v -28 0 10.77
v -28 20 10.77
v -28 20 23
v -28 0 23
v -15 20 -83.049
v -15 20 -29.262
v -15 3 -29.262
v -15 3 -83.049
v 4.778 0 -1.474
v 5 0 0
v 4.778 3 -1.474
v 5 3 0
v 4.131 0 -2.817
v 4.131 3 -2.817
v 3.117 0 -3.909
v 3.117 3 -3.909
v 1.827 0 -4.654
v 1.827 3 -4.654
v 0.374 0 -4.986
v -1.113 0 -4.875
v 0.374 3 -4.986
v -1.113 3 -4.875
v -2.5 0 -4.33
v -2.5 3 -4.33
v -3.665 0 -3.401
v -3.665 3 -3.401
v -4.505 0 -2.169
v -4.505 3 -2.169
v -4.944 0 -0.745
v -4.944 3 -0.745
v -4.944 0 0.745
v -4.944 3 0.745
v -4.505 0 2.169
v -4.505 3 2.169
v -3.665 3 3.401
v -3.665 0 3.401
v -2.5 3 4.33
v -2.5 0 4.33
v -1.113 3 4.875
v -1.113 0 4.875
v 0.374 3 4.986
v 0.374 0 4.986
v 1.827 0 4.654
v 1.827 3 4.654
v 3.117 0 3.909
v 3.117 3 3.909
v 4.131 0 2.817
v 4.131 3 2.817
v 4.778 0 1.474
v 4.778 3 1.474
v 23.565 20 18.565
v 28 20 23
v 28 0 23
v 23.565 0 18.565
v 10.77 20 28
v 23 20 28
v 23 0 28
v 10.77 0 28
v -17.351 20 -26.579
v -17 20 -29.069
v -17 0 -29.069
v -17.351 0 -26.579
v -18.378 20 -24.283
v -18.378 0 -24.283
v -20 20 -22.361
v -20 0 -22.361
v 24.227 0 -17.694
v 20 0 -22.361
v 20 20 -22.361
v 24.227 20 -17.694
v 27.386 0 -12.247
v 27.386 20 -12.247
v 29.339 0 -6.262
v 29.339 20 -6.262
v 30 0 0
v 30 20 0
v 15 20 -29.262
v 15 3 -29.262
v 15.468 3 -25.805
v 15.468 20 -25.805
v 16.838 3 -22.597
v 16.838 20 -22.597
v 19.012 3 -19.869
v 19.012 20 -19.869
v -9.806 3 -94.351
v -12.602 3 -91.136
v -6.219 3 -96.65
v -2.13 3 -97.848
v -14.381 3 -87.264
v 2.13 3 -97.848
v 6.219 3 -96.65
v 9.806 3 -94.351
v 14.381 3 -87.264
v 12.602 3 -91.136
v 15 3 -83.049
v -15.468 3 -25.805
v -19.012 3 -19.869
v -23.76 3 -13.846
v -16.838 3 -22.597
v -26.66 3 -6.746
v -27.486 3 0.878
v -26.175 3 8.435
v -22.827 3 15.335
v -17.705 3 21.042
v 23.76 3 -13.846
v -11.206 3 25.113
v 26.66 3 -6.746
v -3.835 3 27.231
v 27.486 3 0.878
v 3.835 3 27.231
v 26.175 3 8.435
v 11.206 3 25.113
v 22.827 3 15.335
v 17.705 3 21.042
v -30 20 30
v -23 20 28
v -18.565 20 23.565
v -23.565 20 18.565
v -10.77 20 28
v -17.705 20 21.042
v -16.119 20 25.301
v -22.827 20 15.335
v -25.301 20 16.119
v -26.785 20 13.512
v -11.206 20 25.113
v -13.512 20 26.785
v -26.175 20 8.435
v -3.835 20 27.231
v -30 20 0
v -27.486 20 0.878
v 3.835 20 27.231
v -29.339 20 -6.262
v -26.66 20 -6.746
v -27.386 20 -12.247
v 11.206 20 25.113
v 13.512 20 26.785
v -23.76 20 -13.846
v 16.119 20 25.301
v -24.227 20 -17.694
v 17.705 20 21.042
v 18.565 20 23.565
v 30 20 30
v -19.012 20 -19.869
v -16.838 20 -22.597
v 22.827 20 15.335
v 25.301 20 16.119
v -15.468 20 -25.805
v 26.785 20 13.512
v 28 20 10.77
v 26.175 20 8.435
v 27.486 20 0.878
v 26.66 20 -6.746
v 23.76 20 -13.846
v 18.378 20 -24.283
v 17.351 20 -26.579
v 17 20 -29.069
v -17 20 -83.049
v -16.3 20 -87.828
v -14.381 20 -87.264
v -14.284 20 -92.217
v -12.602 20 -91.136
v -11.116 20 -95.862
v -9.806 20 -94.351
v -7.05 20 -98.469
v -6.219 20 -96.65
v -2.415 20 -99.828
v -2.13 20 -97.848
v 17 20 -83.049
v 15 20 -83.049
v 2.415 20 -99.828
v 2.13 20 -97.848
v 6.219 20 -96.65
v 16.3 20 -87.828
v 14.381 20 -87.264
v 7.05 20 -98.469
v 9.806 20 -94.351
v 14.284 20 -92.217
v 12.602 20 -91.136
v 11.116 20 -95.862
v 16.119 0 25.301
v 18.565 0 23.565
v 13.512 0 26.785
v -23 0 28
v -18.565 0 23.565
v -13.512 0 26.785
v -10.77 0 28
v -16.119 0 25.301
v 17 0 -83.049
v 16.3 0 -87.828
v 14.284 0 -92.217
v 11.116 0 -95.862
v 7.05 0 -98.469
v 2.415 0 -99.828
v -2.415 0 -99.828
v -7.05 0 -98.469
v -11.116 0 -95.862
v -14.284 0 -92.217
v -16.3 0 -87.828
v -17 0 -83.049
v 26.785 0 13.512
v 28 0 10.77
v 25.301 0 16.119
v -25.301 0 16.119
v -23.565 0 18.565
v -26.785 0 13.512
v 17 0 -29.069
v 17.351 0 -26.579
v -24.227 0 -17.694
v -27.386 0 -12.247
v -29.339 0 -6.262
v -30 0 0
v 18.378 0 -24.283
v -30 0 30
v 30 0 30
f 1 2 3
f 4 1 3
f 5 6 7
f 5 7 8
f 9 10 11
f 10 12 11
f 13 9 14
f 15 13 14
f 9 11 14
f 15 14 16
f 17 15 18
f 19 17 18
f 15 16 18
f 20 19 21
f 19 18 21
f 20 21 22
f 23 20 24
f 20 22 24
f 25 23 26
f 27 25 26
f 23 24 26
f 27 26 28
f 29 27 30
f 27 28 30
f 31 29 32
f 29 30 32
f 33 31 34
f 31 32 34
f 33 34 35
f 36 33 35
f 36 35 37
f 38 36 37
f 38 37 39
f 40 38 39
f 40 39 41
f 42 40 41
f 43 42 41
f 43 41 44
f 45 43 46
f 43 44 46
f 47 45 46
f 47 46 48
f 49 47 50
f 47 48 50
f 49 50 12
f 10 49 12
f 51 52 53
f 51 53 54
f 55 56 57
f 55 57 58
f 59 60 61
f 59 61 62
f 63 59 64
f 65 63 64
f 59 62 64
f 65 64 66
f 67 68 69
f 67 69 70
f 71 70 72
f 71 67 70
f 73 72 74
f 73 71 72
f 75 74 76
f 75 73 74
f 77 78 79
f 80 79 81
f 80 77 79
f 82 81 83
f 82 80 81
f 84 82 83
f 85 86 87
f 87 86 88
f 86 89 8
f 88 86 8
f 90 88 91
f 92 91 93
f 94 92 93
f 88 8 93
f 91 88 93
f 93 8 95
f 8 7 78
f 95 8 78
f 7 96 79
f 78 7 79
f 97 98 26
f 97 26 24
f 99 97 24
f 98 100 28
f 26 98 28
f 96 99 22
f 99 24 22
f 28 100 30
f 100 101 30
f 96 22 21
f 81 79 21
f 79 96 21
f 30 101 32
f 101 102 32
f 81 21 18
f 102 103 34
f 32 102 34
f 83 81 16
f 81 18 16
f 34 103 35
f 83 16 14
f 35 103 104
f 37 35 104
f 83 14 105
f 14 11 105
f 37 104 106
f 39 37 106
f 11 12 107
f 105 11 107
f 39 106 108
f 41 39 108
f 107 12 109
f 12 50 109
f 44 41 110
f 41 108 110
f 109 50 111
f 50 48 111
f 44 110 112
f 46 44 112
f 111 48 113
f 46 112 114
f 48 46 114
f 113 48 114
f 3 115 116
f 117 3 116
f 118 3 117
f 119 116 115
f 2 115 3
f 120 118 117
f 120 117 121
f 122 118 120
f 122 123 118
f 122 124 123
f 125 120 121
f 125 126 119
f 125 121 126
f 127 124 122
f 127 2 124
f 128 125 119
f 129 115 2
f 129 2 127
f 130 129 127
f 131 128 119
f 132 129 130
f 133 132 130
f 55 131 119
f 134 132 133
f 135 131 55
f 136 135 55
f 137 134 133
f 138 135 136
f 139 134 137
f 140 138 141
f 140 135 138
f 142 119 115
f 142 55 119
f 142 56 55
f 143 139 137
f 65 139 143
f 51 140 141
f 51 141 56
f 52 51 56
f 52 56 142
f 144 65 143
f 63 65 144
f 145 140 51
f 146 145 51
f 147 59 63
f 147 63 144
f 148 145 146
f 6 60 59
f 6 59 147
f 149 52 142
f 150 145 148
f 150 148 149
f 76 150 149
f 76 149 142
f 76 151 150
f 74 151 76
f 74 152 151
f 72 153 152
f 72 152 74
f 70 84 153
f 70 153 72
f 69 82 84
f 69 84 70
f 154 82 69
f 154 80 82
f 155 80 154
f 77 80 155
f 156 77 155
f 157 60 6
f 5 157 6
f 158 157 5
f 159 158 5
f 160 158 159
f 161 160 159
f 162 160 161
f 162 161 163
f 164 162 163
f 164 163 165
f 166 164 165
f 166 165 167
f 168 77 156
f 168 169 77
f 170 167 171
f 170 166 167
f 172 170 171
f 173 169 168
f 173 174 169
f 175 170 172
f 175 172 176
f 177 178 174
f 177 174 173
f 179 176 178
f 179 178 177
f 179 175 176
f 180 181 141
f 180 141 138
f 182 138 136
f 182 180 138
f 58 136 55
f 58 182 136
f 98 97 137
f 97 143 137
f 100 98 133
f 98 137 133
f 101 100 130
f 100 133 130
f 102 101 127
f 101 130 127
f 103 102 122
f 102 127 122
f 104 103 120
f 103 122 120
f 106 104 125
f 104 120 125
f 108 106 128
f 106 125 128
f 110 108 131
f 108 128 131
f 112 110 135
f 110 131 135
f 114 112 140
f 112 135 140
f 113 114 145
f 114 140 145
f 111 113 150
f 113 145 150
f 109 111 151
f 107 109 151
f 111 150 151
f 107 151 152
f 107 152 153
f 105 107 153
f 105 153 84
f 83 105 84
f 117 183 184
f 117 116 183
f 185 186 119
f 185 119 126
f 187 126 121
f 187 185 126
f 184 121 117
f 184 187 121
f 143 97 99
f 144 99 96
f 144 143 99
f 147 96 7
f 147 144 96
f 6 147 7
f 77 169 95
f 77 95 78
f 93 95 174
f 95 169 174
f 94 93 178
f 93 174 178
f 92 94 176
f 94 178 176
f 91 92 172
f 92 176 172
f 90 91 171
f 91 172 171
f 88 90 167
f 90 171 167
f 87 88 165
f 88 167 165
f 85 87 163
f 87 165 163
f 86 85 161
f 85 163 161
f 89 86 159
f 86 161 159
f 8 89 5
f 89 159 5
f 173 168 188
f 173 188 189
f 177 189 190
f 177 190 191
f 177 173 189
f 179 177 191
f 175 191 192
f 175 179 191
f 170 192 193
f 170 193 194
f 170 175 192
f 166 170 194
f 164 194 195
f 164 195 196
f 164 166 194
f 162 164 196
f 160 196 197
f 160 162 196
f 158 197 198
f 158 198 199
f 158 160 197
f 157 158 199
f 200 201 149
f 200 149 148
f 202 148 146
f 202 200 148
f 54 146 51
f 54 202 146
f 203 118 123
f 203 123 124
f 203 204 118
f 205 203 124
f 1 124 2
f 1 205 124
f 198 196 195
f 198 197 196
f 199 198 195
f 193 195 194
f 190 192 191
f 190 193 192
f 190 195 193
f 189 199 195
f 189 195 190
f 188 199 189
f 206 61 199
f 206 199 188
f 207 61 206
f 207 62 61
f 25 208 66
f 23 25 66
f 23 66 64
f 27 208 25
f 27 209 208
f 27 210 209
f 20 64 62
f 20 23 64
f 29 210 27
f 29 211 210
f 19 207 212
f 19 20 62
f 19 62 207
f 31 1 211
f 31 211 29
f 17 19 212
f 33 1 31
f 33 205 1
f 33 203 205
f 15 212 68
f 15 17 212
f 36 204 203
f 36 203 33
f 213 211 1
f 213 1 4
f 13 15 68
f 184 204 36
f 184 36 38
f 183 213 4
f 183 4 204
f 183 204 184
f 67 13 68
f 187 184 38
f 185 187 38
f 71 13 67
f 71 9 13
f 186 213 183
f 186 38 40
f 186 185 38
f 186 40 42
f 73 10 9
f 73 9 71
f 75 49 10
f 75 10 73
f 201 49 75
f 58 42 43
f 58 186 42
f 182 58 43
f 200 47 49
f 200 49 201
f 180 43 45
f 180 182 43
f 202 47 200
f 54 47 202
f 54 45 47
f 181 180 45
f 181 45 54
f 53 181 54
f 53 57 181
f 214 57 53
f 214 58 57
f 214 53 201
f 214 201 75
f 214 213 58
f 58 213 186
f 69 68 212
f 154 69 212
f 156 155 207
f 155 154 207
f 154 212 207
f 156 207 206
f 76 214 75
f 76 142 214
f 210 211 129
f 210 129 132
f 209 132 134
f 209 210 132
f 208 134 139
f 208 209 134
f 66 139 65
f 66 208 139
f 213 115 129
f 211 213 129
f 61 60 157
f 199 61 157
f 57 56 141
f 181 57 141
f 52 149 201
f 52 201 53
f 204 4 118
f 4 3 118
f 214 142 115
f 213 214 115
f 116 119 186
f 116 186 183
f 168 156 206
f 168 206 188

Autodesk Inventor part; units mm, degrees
ref_plane "YZ Plane" through (0, 0, 0) normal (1, 0, 0) x (0, 1, 0)
ref_plane "XZ Plane" through (0, 0, 0) normal (0, 1, 0) x (-1, 0, 0)
ref_plane "XY Plane" through (0, 0, 0) normal (0, 0, 1) x (1, 0, 0)
sketch "Sketch2" plane through (0, 0, 0) normal (0, 1, 0) x (-1, 0, 0)
  circle A0 centre (0, 0) radius 30
  dimension "d0" = 60
extrude "Extrusion1" add sketch "Sketch2" along normal blind 20
sketch "Sketch3" plane through (0, 20, 0) normal (0, 1, 0) x (1, 0, 0)
  circle A0 centre (0, 0) radius 27.5
  dimension "d3" = 55
extrude "Extrusion2" cut sketch "Sketch3" against normal blind 17
sketch "Sketch4" plane through (0, 3, 0) normal (0, 1, 0) x (1, 0, 0)
  circle A0 centre (0, 0) radius 5
  dimension "d6" = 10
extrude "Extrusion3" cut sketch "Sketch4" against normal blind 5
sketch "Sketch9" plane through (0, 20, 0) normal (0, 1, 0) x (1, 0, 0)
  line L0 (-15, 35) -> (15, 35)
  line L1 (15, 35) -> (15, 20)
  line L2 (15, 20) -> (-15, 20)
  line L3 (-15, 20) -> (-15, 35)
  circle A0 centre (0, 0) radius 27.5 projected
  line L4 (-15, 35) -> (15, 20) construction
  line L5 (15, 35) -> (-15, 20) construction
  point P0 (0, 27.5)
extrude "Extrusion6" cut sketch "Sketch9" against normal blind 17 contours L0 L1 A0 L3 | A0 L1 L2 L3 picked at (1.0554, 22.439)
sketch "Sketch10" plane through (0, 20, 0) normal (0, 1, 0) x (1, 0, 0)
  arc A0 (-15, 23.0489) -> (15, 23.0489) centre (0, 0) ccw projected
  line L0 (-15, 23.0489) -> (-17, 23.0489)
  line L1 (-17, 23.0489) -> (-17, 83.0489)
  line L2 (-17, 83.0489) -> (-15, 83.0489)
  line L3 (-15, 83.0489) -> (-15, 23.0489)
  line L4 (15, 25.9808) -> (15, 23.0489) projected
  line L5 (15, 23.0489) -> (17, 23.0489)
  line L6 (17, 23.0489) -> (17, 83.0489)
  line L7 (17, 83.0489) -> (15, 83.0489)
  line L8 (15, 83.0489) -> (15, 23.0489)
  dimension "d17" = 60
  dimension "d18" = 60
extrude "Extrusion7" add sketch "Sketch10" against normal blind 20
fillet "Fillet1" radius 13 1 edges at (-15, 11.5, -23.0489)
fillet "Fillet2" radius 9 1 edges at (-17, 10, -24.7184)
fillet "Fillet3" radius 13 1 edges at (15, 11.5, -23.0489)
fillet "Fillet4" radius 9 1 edges at (17, 10, -24.7184)
sketch "Sketch12" plane through (0, 0, 0) normal (0, -1, 0) x (1, 0, 0)
  line L0 (-15, -29.2617) -> (-15, -83.0489) projected
  line L1 (15, -25.9808) -> (-15, -25.9808)
  line L2 (-15, -25.9808) -> (-15, -83.0489)
  line L3 (-15, -83.0489) -> (15, -83.0489)
  line L4 (15, -83.0489) -> (15, -25.9808)
  point P0 (0, 0)
extrude "Extrusion8" add sketch "Sketch12" against normal blind 3
sketch "Sketch13" plane through (0, 20, 0) normal (0, 1, 0) x (1, 0, 0)
  arc A0 (-20, 22.3607) -> (20, 22.3607) centre (0, 0) ccw projected
  line L0 (30, 0) -> (28, 0)
  line L1 (28, 0) -> (28, -30)
  line L2 (28, -30) -> (30, -30)
  line L3 (30, -30) -> (30, 0)
  line L4 (-30, 0) -> (-28, 0)
  line L5 (-28, 0) -> (-28, -30)
  line L6 (-28, -30) -> (-30, -30)
  line L7 (-30, -30) -> (-30, 0)
extrude "Extrusion9" add sketch "Sketch13" against normal blind 20
sketch "Sketch14" plane through (0, 20, 0) normal (0, 1, 0) x (1, 0, 0)
  line L0 (-30, -30) -> (-30, 0) projected
  line L1 (30, 0) -> (30, -30) projected
  line L2 (-30, -30) -> (30, -30)
  line L3 (30, -30) -> (30, -28)
  line L4 (30, -28) -> (-30, -28)
  line L5 (-30, -28) -> (-30, -30)
  point P0 (0, 0)
extrude "Extrusion10" add sketch "Sketch14" against normal blind 20
sketch "Sketch17" plane through (28, 0, 10.7703) normal (-1, 0, 0) x (0, 0, 1)
  point P0 (-10.7703, 0)
sketch "Sketch21" plane through (0, 20, 0) normal (0, 1, 0) x (1, 0, 0)
  line L0 (15, 83.0489) -> (-15, 83.0489) projected
  line L1 (-15, 83.0489) -> (-17, 83.0489) projected
  arc A0 (15, 83.0489) -> (-15, 83.0489) centre (0, 82.9999) ccw
  arc A1 (17, 83.0489) -> (-17, 83.0489) centre (0, 82.9999) ccw
  line L2 (-17, 83.0489) -> (-17, 29.0689) projected
  line L3 (-17, 83.0489) -> (-15, 83.0489)
  line L4 (15, 83.0489) -> (17, 83.0489)
  point P0 (0, 0)
extrude "Extrusion15" add sketch "Sketch21" against normal blind 20 contours A0 L1 A1 L4
sketch "Sketch22" plane through (0, 0, 0) normal (0, -1, 0) x (1, 0, 0)
  line L0 (15, -83.0489) -> (15, -25.1247) projected
  arc A0 (-15, -83.0489) -> (15, -83.0489) centre (0, -82.9999) ccw
  line L1 (-15, -83.0489) -> (15, -83.0489) projected
  line L2 (15, -83.0489) -> (-15, -83.0489)
  point P0 (0, 0)
extrude "Extrusion16" add sketch "Sketch22" against normal blind 3
sketch "Sketch23" plane through (0, 0, 0) normal (0, -1, 0) x (1, 0, 0)
  line L0 (15.995, -25.328) -> (14.0863, -25.328)
  line L1 (14.0863, -25.328) -> (14.0863, -29.7912)
  line L2 (14.0863, -29.7912) -> (15.995, -29.7912)
  line L3 (15.995, -29.7912) -> (15.995, -25.328)
  line L4 (-13.7592, -25.328) -> (-16.454, -25.328)
  line L5 (-16.454, -25.328) -> (-16.454, -29.7912)
  line L6 (-16.454, -29.7912) -> (-13.7592, -29.7912)
  line L7 (-13.7592, -29.7912) -> (-13.7592, -25.328)
  point P0 (0, 0)
extrude "Extrusion17" add sketch "Sketch23" against normal blind 3
sketch "Sketch25" plane through (0, 20, 0) normal (0, 1, 0) x (1, 0, 0)
  line L0 (28, -28) -> (10.7703, -28) projected
  line L1 (28, -28) -> (21.2132, -21.2132)
  arc A0 (10.7703, -28) -> (28, -10.7703) centre (0, 0) ccw projected
  line L2 (28, -28) -> (37.598, -28) construction
  line L3 (28, -28) -> (23, -28)
  line L4 (23, -28) -> (18.5654, -23.5654)
  line L5 (28, -28) -> (28, -23)
  line L6 (28, -23) -> (23.5654, -18.5654)
  line L7 (23.5654, -18.5654) -> (18.5654, -23.5654)
  line L8 (21.2132, -21.2132) -> (21.0654, -21.0654)
  dimension "d53" = 135
  dimension "d54" = 5
  dimension "d55" = 135
  dimension "d56" = 5
  dimension "d57" = 135
extrude "Extrusion19" add sketch "Sketch25" against normal blind 20 contours L0 L4 A0 L1 | L1 A0 L6 L5
sketch "Sketch27" plane through (0, 20, 0) normal (0, 1, 0) x (1, 0, 0)
  line L0 (-28, -28) -> (-28, -10.7703) projected
  line L1 (-28, -28) -> (-21.2132, -21.2132)
  arc A0 (-28, -10.7703) -> (-10.7703, -28) centre (0, 0) ccw projected
  line L2 (-28, -28) -> (-18.402, -28) construction
  line L3 (-28, -28) -> (-23, -28)
  line L4 (-28, -28) -> (-28, -23)
  line L5 (-28, -23) -> (-23.5654, -18.5654)
  line L6 (-23, -28) -> (-18.5654, -23.5654)
  line L7 (-23, -28) -> (-16.7285, -28) construction
  line L8 (-18.5654, -23.5654) -> (-23.5654, -18.5654)
  dimension "d60" = 45
  dimension "d61" = 5
  dimension "d62" = 5
  dimension "d63" = 135
  dimension "d64" = 45
extrude "Extrusion20" add sketch "Sketch27" against normal blind 20 contours L0 L5 A0 L1 | L1 A0 L6 L3
properties part number "Axel chamber"
